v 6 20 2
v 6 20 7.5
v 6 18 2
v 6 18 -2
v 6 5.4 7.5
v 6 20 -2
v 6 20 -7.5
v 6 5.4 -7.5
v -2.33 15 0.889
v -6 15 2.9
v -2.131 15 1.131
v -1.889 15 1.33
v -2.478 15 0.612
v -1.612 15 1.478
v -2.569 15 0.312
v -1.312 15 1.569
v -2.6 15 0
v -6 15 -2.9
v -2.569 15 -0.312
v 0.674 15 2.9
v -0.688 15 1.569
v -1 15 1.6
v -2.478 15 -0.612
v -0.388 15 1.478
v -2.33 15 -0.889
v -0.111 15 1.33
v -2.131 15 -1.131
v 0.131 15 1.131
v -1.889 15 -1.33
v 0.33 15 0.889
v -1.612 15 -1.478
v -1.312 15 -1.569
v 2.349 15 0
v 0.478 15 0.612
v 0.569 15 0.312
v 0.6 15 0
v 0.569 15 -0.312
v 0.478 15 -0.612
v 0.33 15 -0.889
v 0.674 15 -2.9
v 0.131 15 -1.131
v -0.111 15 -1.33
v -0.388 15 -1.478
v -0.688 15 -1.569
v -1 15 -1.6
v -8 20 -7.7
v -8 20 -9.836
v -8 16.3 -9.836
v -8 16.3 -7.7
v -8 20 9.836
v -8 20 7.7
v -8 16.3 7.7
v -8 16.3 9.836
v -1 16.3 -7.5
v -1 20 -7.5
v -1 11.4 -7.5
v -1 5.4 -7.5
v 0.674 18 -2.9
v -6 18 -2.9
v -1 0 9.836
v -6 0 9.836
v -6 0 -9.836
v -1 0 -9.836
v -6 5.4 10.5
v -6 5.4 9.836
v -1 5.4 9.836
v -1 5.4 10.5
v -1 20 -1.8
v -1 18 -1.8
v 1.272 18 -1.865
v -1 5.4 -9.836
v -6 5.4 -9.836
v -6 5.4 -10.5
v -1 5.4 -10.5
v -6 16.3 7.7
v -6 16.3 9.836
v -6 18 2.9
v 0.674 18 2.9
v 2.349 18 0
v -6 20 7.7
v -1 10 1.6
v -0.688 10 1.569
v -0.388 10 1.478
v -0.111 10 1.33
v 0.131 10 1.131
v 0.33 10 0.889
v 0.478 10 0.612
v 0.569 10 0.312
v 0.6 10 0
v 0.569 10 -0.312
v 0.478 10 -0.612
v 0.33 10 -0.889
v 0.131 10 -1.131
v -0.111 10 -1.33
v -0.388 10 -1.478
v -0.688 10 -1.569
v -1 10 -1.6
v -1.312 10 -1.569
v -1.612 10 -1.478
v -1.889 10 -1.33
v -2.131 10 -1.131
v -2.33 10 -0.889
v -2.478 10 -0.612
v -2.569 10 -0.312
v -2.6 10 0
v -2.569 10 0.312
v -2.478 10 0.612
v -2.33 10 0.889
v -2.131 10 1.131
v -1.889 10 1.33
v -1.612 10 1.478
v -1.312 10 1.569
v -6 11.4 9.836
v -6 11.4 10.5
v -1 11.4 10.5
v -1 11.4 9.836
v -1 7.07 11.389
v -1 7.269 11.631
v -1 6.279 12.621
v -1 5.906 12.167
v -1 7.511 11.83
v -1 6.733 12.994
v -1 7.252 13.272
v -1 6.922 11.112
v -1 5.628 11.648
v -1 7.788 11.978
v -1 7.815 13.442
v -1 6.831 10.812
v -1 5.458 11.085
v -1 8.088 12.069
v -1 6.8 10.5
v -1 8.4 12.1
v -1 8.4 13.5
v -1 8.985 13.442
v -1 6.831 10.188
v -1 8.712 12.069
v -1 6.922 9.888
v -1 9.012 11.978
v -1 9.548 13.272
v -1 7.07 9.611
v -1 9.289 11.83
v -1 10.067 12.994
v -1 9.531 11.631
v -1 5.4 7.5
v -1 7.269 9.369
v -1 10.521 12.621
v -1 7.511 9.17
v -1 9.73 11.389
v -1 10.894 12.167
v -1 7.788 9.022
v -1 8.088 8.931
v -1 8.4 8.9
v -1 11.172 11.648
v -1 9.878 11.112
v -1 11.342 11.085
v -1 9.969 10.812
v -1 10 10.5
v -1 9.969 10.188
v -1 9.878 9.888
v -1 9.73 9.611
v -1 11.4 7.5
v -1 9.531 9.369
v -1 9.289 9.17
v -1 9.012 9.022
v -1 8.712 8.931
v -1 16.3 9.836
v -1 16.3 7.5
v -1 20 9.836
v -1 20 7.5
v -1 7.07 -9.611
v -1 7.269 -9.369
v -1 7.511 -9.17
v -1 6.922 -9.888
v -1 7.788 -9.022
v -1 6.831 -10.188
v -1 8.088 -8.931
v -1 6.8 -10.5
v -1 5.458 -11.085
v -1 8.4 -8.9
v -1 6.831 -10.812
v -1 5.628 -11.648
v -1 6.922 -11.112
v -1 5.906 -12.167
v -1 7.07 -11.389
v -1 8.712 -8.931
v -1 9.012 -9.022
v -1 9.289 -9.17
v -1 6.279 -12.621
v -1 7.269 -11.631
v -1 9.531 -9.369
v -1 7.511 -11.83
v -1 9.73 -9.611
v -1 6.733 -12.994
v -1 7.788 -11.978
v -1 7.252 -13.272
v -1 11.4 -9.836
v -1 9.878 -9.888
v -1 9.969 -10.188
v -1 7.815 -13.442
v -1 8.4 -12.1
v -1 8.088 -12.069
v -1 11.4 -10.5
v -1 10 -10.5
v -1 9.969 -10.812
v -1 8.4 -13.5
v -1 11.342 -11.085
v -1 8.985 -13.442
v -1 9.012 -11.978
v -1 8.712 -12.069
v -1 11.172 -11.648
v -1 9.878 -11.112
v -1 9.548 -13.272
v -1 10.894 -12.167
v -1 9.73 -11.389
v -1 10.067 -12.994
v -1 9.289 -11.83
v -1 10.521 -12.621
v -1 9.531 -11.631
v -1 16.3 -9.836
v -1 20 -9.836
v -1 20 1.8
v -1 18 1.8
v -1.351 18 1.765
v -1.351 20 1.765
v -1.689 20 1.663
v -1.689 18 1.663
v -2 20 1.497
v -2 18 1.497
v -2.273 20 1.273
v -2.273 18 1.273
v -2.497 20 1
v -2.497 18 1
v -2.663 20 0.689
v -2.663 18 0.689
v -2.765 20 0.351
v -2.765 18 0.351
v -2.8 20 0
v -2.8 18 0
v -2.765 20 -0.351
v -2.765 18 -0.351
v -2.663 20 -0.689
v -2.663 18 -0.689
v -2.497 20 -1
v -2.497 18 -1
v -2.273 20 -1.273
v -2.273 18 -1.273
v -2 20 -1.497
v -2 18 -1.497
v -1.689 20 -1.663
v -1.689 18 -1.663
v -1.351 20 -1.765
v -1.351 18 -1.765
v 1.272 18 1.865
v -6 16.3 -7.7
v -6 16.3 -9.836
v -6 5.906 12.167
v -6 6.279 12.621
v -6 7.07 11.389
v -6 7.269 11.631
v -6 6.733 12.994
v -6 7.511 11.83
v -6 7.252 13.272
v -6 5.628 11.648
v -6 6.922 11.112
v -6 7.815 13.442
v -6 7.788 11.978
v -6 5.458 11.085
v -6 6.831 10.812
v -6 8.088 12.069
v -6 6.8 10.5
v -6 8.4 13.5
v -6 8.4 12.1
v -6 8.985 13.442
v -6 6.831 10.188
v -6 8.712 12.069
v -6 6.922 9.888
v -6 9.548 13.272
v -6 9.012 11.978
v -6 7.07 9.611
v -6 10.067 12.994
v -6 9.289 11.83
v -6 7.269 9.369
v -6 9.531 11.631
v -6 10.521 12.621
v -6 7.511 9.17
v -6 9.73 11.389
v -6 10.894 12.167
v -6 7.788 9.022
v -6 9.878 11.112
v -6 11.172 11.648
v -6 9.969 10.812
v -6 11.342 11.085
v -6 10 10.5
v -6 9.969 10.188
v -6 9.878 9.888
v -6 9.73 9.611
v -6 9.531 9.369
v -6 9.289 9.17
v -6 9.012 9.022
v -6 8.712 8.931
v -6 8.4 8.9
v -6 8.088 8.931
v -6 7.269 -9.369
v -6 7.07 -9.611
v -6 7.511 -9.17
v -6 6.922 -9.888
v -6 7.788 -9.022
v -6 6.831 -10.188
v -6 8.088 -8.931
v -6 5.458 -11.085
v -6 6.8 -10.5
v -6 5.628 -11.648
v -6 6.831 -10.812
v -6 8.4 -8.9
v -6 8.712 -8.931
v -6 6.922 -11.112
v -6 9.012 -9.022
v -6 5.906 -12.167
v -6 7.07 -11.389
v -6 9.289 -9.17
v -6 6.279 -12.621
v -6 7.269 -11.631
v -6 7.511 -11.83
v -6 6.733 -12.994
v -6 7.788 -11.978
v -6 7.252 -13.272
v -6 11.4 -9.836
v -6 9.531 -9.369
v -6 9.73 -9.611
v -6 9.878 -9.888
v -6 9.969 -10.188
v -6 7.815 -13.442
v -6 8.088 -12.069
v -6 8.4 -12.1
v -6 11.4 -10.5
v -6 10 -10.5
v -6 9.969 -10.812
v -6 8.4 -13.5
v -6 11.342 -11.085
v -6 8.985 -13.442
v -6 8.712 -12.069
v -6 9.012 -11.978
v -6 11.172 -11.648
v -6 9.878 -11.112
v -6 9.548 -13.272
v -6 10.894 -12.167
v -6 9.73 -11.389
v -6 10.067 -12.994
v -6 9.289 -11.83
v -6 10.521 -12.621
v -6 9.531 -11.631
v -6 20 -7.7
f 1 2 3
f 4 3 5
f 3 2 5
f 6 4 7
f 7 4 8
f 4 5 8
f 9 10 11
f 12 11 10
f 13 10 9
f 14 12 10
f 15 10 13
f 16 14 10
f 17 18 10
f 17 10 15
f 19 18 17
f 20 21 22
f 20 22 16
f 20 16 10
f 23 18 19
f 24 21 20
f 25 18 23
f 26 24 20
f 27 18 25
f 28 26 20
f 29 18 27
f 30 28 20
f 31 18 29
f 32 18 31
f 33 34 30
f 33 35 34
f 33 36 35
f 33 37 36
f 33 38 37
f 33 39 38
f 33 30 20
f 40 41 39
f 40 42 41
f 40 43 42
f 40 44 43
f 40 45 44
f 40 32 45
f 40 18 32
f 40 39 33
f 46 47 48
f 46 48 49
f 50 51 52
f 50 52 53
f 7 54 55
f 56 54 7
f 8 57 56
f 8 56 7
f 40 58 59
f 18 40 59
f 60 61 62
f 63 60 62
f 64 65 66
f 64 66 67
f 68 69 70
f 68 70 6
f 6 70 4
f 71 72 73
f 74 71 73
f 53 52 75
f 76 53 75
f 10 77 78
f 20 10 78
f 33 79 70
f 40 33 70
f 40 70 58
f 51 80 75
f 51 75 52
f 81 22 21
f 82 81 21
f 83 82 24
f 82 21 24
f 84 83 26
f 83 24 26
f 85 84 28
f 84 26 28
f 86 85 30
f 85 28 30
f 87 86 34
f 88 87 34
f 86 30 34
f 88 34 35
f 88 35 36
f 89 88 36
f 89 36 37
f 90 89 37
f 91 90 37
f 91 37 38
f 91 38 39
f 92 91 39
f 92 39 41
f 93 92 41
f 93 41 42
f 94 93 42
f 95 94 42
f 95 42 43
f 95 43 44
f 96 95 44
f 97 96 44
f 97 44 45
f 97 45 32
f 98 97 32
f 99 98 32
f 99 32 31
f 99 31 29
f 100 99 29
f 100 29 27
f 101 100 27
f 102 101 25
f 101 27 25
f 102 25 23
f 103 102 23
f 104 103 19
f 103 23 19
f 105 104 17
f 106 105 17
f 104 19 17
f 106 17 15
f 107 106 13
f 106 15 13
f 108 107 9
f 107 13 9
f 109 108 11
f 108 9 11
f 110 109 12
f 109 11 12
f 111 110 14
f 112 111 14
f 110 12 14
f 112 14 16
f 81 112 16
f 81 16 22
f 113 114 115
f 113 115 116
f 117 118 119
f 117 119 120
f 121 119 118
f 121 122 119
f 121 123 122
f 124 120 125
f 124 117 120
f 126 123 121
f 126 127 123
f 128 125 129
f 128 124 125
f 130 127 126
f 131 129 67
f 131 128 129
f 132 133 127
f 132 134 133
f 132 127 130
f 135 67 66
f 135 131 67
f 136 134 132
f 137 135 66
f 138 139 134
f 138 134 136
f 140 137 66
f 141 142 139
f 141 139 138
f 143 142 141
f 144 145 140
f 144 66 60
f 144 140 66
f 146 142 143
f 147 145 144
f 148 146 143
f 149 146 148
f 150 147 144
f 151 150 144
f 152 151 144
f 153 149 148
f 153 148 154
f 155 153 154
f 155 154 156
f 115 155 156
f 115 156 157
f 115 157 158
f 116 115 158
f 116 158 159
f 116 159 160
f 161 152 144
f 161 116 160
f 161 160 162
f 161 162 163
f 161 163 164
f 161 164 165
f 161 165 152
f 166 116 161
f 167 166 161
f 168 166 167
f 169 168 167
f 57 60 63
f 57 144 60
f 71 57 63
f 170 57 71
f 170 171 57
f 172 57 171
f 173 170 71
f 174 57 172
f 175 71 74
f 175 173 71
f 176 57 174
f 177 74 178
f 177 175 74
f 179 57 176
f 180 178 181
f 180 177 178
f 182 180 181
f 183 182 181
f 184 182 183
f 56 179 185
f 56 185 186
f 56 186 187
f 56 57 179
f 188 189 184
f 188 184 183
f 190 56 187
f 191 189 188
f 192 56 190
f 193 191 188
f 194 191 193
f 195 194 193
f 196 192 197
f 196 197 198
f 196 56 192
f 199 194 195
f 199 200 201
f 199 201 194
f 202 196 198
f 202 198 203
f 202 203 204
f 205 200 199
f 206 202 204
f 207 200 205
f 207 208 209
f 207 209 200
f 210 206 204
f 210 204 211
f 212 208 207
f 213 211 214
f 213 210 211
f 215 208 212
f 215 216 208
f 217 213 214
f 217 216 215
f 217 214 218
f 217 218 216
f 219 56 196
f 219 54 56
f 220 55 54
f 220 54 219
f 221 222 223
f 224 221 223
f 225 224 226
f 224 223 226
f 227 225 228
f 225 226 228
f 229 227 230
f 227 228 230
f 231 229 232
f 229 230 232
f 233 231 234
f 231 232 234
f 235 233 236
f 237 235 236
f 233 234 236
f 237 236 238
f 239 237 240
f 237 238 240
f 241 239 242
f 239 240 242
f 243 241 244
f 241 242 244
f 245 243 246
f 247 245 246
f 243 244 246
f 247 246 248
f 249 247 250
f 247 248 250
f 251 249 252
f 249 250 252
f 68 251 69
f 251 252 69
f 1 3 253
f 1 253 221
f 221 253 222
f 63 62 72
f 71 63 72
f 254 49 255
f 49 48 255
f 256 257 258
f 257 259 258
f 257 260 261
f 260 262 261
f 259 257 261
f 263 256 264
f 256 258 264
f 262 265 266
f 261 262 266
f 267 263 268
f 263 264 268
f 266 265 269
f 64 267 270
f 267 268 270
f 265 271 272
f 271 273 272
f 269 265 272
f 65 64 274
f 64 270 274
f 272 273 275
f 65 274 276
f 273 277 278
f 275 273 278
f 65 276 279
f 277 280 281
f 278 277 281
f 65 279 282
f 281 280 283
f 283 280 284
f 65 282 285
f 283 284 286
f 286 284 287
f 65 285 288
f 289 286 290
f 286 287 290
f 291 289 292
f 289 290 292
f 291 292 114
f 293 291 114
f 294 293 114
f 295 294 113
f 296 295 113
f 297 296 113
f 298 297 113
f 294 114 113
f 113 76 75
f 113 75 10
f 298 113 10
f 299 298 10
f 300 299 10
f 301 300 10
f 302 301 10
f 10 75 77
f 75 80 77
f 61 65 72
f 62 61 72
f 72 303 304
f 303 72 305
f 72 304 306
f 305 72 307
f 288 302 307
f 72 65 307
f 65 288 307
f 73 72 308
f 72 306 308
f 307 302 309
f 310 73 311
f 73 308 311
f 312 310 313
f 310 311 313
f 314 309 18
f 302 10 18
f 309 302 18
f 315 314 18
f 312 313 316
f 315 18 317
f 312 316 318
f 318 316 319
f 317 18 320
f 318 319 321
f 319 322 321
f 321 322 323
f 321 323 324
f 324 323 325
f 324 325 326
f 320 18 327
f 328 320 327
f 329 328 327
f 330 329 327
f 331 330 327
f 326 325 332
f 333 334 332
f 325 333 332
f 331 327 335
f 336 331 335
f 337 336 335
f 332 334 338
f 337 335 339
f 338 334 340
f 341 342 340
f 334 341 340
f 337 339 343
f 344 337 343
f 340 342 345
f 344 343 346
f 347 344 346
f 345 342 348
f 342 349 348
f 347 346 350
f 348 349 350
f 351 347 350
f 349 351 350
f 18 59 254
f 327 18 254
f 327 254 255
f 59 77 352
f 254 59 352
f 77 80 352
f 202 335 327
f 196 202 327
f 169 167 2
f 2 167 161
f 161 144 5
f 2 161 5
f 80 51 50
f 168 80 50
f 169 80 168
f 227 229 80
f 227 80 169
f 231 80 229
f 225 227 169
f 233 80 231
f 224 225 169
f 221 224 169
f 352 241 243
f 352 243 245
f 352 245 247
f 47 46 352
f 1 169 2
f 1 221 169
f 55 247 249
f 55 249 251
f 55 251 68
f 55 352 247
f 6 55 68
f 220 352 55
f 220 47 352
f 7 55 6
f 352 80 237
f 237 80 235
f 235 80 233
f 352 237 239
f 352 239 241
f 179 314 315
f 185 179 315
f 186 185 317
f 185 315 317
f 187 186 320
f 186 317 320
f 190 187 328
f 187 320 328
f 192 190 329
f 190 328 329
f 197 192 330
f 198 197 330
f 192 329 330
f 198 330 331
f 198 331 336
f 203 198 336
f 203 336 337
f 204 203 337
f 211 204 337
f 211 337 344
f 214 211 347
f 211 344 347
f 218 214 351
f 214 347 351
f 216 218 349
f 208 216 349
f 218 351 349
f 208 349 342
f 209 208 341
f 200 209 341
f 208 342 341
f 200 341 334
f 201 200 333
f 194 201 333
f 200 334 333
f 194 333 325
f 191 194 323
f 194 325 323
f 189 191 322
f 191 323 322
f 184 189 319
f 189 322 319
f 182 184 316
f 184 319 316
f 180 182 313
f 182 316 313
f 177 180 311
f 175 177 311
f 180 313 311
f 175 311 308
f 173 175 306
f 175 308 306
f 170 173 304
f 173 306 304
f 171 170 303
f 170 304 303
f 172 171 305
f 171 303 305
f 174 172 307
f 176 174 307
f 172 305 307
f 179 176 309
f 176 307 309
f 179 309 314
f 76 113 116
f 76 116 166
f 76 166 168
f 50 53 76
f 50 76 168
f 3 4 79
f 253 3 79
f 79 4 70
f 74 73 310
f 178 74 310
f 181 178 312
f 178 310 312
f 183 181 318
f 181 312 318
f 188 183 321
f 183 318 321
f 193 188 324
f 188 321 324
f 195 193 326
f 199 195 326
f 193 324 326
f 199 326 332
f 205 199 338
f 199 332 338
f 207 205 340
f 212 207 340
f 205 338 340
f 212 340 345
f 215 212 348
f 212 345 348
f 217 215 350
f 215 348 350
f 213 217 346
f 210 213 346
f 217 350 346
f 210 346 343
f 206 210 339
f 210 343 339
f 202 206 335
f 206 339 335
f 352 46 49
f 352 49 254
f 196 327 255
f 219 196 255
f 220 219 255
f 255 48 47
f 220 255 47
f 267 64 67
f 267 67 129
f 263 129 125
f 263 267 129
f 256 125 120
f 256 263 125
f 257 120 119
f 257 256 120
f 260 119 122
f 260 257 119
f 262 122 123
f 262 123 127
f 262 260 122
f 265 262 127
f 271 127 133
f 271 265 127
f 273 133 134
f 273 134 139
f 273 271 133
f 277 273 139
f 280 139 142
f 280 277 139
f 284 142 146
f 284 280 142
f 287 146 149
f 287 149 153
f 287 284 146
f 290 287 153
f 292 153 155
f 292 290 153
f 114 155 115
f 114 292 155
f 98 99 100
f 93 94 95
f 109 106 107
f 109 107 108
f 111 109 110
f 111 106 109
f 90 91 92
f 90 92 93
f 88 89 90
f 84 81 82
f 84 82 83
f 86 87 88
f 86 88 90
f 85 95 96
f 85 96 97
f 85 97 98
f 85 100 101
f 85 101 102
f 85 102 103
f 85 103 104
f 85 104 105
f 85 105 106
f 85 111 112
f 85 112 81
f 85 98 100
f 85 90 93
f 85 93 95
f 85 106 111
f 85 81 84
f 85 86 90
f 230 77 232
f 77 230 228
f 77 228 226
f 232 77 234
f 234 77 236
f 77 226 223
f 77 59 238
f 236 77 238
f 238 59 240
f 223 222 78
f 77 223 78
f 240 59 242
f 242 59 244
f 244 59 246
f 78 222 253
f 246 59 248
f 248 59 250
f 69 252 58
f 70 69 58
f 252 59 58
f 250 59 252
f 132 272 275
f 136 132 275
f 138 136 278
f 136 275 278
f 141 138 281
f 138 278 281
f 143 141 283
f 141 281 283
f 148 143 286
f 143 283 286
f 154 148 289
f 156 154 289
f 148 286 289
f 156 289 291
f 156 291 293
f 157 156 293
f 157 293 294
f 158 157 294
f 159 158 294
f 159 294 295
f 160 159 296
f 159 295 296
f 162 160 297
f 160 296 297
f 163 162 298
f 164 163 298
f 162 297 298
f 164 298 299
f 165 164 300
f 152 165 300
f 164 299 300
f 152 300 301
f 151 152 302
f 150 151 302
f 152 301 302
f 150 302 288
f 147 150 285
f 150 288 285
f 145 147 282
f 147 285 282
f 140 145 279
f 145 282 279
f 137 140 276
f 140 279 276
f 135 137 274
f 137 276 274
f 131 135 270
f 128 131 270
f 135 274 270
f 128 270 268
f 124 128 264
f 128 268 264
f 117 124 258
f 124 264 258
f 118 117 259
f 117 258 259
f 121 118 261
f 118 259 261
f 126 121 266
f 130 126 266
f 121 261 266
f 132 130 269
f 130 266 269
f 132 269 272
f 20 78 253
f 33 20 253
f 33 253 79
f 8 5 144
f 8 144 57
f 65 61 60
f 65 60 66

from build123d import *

# Parameters (mm, degrees)
SKETCH1_W           = 12
SKETCH1_H           = 15
BOSS_EXTRUDE1_DEPTH = 20
SKETCH2_R           = 1.6
BOSS_EXTRUDE2_DEPTH = 5
SKETCH3_R           = 1.6
CUT_EXTRUDE1_DEPTH  = 10
CUT_EXTRUDE2_DEPTH  = 3
CUT_EXTRUDE3_DEPTH  = 2
BOSS_EXTRUDE4_DEPTH = 3.7
BOSS_EXTRUDE5_START = -5
SKETCH8_W           = 2.336067977
SKETCH8_H           = 8.6
BOSS_EXTRUDE5_DEPTH = 5
SKETCH10_W          = 15
SKETCH10_H          = 5.4
CUT_EXTRUDE5_DEPTH  = 7
BOSS_EXTRUDE8_START = -5
SKETCH13_W          = 2.336067977
SKETCH13_H          = 5.4
BOSS_EXTRUDE8_DEPTH = 5


with BuildPart() as part:
    # Sketch1 → Boss-Extrude1 (new body)
    with BuildSketch(Plane(origin=(0, 0, 0), x_dir=(1, 0, 0), z_dir=(0, 1, 0))):
        Rectangle(SKETCH1_W, SKETCH1_H)
    extrude(amount=BOSS_EXTRUDE1_DEPTH)

    # Sketch2 → Boss-Extrude2 (add)
    # profile 1 of 2: a face of its own
    with BuildSketch(Plane.ZY.offset(6)):
        with BuildLine():
            Line((10.5, 11.4), (7.5, 11.4))
            Line((7.5, 11.4), (7.5, 5.4))
            Line((7.5, 5.4), (10.5, 5.4))
            ThreePointArc((10.5, 5.4), (13.5, 8.4), (10.5, 11.4))
        make_face()
        with Locations((10.5, 8.4)):
            Circle(SKETCH2_R, mode=Mode.SUBTRACT)
    # profile 2 of 2: a face of its own
    with BuildSketch(Plane.ZY.offset(6)):
        with BuildLine():
            Line((-10.5, 11.4), (-7.5, 11.4))
            Line((-7.5, 11.4), (-7.5, 5.4))
            Line((-7.5, 5.4), (-10.5, 5.4))
            ThreePointArc((-10.5, 5.4), (-13.5, 8.4), (-10.5, 11.4))
        make_face()
        with Locations((-10.5, 8.4)):
            Circle(SKETCH2_R, mode=Mode.SUBTRACT)
    extrude(amount=-BOSS_EXTRUDE2_DEPTH)

    # Sketch3 → Cut-Extrude1 (cut)
    with BuildSketch(Plane(origin=(0, 20, 0), x_dir=(1, 0, 0), z_dir=(0, 1, 0))):
        with Locations(Location((-1, 0, 0), (0, 0, 270))):
            Circle(SKETCH3_R)
    extrude(amount=-CUT_EXTRUDE1_DEPTH, mode=Mode.SUBTRACT)

    # Sketch4 → Cut-Extrude2 (cut)
    with BuildSketch(Plane(origin=(0, 18, 0), x_dir=(1, 0, 0), z_dir=(0, 1, 0))):
        Polygon((-2.674315781, 2.9), (-6, 2.9), (-6, -2.9), (-2.674315781, -2.9), (0.674315781, -2.9), (2.348631561, 0), (0.674315781, 2.9), align=None)
    extrude(amount=-CUT_EXTRUDE2_DEPTH, mode=Mode.SUBTRACT)

    # Sketch5 → Cut-Extrude3 (cut)
    with BuildSketch(Plane(origin=(0, 18, 0), x_dir=(1, 0, 0), z_dir=(0, 1, 0))):
        with BuildLine():
            Line((-1, 1.8), (6, 2))
            Line((6, 2), (6, 0))
            Line((6, 0), (6, -2))
            Line((6, -2), (-1, -1.8))
            ThreePointArc((-1, -1.8), (-2.8, 0), (-1, 1.8))
        make_face()
    extrude(amount=CUT_EXTRUDE3_DEPTH, mode=Mode.SUBTRACT)

    # Sketch6 → Boss-Extrude4 (add)
    with BuildSketch(Plane(origin=(0, 20, 0), x_dir=(1, 0, 0), z_dir=(0, 1, 0))):
        Polygon((-6, 7.7), (-6, 7.5), (-1, 7.5), (-1, 9.836067977), (-8, 9.836067977), (-8, 7.7), align=None)
        Polygon((-1, -7.5), (-6, -7.5), (-6, -7.7), (-8, -7.7), (-8, -9.836067977), (-1, -9.836067977), align=None)
    extrude(amount=-BOSS_EXTRUDE4_DEPTH)

    # Sketch8 → Boss-Extrude5 (add)
    with BuildSketch(Plane(origin=(-1, 0, 0), x_dir=(0, 0, -1), z_dir=(1, 0, 0)).offset(BOSS_EXTRUDE5_START)):
        with Locations((-8.668033989, 15.7)):
            Rectangle(SKETCH8_W, SKETCH8_H)
        with Locations((8.668033989, 15.7)):
            Rectangle(SKETCH8_W, SKETCH8_H)
    extrude(amount=BOSS_EXTRUDE5_DEPTH)

    # Sketch10 → Cut-Extrude5 (cut)
    with BuildSketch(Plane(origin=(6, 0, 0), x_dir=(0, 0, -1), z_dir=(1, 0, 0))):
        with Locations((0, 2.7)):
            Rectangle(SKETCH10_W, SKETCH10_H)
    extrude(amount=-CUT_EXTRUDE5_DEPTH, mode=Mode.SUBTRACT)

    # Sketch13 → Boss-Extrude8 (add)
    with BuildSketch(Plane(origin=(-1, 0, 0), x_dir=(0, 0, -1), z_dir=(1, 0, 0)).offset(BOSS_EXTRUDE8_START)):
        with Locations((8.668033989, 2.7)):
            Rectangle(SKETCH13_W, SKETCH13_H)
        with Locations((-8.668033989, 2.7)):
            Rectangle(SKETCH13_W, SKETCH13_H)
    extrude(amount=BOSS_EXTRUDE8_DEPTH)


solid = part.part
